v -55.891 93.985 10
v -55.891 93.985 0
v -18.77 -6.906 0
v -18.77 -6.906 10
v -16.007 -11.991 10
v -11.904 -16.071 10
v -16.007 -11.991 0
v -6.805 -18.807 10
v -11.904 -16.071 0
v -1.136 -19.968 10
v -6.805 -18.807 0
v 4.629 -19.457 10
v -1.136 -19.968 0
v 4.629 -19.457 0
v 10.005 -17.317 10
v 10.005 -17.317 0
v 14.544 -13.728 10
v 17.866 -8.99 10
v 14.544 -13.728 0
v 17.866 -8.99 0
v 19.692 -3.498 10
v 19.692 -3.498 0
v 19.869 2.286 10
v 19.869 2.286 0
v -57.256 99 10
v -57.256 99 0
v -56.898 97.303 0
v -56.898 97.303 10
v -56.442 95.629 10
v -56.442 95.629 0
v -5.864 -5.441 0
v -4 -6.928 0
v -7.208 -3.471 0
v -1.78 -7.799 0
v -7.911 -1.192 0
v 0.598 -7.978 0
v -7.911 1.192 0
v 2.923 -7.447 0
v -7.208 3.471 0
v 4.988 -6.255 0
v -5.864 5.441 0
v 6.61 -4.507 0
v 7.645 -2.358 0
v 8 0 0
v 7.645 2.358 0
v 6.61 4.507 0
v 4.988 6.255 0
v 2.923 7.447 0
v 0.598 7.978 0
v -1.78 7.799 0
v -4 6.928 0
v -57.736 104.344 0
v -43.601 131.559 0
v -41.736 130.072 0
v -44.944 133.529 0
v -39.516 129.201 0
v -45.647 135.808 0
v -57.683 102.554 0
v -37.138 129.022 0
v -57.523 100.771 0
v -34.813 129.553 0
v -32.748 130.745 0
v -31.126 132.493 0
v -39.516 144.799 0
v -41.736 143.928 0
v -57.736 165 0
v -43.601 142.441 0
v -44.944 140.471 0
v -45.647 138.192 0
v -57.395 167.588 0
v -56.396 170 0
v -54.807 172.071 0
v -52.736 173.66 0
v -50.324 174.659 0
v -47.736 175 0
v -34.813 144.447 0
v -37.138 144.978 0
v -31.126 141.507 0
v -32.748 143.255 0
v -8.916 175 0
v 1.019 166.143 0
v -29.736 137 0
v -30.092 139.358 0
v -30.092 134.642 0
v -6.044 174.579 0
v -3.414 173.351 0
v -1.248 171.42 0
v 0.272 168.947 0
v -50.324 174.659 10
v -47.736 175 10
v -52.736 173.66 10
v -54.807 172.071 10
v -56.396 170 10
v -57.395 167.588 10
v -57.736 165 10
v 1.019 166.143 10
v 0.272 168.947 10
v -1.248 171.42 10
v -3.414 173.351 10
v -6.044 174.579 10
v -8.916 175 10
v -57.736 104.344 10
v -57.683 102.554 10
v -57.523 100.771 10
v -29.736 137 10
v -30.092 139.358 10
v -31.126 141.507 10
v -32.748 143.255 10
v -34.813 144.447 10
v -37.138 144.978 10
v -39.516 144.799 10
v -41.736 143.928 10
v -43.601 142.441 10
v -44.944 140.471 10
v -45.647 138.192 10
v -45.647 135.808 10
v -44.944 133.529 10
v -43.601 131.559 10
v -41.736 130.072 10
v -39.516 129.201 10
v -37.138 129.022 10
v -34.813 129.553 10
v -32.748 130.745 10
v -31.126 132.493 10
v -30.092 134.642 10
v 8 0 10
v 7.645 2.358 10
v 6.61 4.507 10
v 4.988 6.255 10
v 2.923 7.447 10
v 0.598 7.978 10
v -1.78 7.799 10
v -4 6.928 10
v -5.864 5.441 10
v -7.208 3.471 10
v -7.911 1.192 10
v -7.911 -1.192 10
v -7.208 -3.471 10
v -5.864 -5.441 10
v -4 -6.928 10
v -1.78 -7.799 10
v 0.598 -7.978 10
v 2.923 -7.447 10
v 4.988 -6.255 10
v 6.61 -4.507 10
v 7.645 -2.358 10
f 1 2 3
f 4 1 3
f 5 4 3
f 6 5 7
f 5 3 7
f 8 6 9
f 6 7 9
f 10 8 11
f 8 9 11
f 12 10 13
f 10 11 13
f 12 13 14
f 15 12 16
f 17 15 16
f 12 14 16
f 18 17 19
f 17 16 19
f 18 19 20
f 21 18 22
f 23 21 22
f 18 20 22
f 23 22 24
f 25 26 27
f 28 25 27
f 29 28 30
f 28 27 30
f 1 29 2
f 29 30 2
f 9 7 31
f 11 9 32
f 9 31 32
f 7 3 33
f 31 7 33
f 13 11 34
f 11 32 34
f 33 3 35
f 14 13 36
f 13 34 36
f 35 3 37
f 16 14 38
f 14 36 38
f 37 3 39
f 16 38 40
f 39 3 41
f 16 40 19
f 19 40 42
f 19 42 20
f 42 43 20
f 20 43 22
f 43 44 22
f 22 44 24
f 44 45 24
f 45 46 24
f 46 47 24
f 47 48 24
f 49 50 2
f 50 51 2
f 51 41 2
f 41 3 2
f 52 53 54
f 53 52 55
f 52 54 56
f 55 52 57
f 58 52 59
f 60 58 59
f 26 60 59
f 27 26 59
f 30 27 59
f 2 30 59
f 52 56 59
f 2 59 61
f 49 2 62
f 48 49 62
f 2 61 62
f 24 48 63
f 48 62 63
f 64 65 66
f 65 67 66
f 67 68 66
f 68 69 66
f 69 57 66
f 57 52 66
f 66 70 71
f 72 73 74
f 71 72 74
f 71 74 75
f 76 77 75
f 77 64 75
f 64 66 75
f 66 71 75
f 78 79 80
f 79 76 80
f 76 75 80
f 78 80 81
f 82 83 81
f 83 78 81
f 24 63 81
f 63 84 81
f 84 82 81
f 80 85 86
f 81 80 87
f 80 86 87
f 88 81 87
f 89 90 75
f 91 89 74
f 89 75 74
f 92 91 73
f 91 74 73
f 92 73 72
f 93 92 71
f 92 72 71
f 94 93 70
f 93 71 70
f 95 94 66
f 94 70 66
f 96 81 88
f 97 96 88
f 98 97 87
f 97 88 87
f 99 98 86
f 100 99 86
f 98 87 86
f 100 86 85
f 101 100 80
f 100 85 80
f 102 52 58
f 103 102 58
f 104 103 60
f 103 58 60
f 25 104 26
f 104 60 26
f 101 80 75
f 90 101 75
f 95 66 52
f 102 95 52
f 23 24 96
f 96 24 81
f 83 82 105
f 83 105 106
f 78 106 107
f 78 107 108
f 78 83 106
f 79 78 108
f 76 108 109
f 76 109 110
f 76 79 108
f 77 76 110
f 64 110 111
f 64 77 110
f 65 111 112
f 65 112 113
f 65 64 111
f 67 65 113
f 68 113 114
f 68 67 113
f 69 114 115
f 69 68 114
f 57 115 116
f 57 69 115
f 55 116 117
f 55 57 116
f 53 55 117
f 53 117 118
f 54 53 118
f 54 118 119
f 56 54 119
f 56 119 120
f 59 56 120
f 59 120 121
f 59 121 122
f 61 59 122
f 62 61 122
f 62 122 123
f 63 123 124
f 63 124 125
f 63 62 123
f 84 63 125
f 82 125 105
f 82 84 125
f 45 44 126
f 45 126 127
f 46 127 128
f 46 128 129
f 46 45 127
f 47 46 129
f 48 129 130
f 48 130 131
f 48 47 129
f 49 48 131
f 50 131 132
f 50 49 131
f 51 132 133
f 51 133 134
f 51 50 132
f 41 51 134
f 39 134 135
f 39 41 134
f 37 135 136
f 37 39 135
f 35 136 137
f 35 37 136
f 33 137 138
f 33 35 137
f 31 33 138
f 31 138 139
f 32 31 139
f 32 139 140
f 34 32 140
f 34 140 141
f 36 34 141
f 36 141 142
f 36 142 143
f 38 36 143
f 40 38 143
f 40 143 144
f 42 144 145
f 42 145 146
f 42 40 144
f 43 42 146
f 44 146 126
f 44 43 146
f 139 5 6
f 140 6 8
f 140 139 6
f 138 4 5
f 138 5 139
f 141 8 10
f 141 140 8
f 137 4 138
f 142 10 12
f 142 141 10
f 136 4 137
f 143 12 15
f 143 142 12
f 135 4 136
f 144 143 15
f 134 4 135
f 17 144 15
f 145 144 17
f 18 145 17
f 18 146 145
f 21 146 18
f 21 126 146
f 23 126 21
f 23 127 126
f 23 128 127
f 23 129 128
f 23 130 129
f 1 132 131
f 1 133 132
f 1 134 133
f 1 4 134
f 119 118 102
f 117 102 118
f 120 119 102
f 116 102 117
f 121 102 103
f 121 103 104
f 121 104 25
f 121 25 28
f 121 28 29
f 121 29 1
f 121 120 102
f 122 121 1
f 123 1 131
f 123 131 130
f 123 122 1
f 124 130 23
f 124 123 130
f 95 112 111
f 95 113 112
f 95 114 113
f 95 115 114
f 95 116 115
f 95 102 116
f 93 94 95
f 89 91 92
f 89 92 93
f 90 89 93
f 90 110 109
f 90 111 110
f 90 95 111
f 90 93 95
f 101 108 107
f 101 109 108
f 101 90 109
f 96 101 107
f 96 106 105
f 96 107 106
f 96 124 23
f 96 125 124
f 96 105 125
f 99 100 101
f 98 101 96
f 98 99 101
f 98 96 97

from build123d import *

# Parameters (mm, degrees)
SZKIC1_R                    = 20
SZKIC1_R_2                  = 8
DODANIE_WYCI_GNI_CIE3_DEPTH = 10


with BuildPart() as part:
    # Szkic1 → Dodanie-wyciągnięcie3 (new body)
    # profile 1 of 3: a face of its own
    with BuildSketch(Plane.XY):
        with BuildLine():
            ThreePointArc((-57.25630176, 99), (-56.682391116, 96.462784094), (-55.890841639, 93.984823763))
            Line((-55.890841639, 93.984823763), (-18.769836395, -6.906029373))
            ThreePointArc((-18.769836395, -6.906029373), (-4.628612665, 19.457028159), (19.868958458, 2.285714286))
            Line((19.868958458, 2.285714286), (1.018920947, 166.142857143))
            ThreePointArc((1.018920947, 166.142857143), (-2.260807026, 172.464200273), (-8.915558282, 175))
            Line((-8.915558282, 175), (-17.736087047, 175))
            Line((-17.736087047, 175), (-17.736087047, 99))
            Line((-17.736087047, 99), (-57.25630176, 99))
        make_face()
    # profile 2 of 3: a face of its own
    with BuildSketch(Plane.XY):
        Circle(SZKIC1_R)
        Circle(SZKIC1_R_2, mode=Mode.SUBTRACT)
    # profile 3 of 3: a face of its own
    with BuildSketch(Plane.XY):
        with BuildLine():
            ThreePointArc((-57.736087047, 104.343867823), (-57.615899976, 101.661186457), (-57.25630176, 99))
            Line((-57.25630176, 99), (-17.736087047, 99))
            Line((-17.736087047, 99), (-17.736087047, 175))
            Line((-17.736087047, 175), (-47.736087047, 175))
            ThreePointArc((-47.736087047, 175), (-54.807154859, 172.071067812), (-57.736087047, 165))
            Line((-57.736087047, 165), (-57.736087047, 104.343867823))
        make_face()
        with Locations((-37.736087047, 137)):
            Circle(SZKIC1_R_2, mode=Mode.SUBTRACT)
    extrude(amount=DODANIE_WYCI_GNI_CIE3_DEPTH)


solid = part.part
